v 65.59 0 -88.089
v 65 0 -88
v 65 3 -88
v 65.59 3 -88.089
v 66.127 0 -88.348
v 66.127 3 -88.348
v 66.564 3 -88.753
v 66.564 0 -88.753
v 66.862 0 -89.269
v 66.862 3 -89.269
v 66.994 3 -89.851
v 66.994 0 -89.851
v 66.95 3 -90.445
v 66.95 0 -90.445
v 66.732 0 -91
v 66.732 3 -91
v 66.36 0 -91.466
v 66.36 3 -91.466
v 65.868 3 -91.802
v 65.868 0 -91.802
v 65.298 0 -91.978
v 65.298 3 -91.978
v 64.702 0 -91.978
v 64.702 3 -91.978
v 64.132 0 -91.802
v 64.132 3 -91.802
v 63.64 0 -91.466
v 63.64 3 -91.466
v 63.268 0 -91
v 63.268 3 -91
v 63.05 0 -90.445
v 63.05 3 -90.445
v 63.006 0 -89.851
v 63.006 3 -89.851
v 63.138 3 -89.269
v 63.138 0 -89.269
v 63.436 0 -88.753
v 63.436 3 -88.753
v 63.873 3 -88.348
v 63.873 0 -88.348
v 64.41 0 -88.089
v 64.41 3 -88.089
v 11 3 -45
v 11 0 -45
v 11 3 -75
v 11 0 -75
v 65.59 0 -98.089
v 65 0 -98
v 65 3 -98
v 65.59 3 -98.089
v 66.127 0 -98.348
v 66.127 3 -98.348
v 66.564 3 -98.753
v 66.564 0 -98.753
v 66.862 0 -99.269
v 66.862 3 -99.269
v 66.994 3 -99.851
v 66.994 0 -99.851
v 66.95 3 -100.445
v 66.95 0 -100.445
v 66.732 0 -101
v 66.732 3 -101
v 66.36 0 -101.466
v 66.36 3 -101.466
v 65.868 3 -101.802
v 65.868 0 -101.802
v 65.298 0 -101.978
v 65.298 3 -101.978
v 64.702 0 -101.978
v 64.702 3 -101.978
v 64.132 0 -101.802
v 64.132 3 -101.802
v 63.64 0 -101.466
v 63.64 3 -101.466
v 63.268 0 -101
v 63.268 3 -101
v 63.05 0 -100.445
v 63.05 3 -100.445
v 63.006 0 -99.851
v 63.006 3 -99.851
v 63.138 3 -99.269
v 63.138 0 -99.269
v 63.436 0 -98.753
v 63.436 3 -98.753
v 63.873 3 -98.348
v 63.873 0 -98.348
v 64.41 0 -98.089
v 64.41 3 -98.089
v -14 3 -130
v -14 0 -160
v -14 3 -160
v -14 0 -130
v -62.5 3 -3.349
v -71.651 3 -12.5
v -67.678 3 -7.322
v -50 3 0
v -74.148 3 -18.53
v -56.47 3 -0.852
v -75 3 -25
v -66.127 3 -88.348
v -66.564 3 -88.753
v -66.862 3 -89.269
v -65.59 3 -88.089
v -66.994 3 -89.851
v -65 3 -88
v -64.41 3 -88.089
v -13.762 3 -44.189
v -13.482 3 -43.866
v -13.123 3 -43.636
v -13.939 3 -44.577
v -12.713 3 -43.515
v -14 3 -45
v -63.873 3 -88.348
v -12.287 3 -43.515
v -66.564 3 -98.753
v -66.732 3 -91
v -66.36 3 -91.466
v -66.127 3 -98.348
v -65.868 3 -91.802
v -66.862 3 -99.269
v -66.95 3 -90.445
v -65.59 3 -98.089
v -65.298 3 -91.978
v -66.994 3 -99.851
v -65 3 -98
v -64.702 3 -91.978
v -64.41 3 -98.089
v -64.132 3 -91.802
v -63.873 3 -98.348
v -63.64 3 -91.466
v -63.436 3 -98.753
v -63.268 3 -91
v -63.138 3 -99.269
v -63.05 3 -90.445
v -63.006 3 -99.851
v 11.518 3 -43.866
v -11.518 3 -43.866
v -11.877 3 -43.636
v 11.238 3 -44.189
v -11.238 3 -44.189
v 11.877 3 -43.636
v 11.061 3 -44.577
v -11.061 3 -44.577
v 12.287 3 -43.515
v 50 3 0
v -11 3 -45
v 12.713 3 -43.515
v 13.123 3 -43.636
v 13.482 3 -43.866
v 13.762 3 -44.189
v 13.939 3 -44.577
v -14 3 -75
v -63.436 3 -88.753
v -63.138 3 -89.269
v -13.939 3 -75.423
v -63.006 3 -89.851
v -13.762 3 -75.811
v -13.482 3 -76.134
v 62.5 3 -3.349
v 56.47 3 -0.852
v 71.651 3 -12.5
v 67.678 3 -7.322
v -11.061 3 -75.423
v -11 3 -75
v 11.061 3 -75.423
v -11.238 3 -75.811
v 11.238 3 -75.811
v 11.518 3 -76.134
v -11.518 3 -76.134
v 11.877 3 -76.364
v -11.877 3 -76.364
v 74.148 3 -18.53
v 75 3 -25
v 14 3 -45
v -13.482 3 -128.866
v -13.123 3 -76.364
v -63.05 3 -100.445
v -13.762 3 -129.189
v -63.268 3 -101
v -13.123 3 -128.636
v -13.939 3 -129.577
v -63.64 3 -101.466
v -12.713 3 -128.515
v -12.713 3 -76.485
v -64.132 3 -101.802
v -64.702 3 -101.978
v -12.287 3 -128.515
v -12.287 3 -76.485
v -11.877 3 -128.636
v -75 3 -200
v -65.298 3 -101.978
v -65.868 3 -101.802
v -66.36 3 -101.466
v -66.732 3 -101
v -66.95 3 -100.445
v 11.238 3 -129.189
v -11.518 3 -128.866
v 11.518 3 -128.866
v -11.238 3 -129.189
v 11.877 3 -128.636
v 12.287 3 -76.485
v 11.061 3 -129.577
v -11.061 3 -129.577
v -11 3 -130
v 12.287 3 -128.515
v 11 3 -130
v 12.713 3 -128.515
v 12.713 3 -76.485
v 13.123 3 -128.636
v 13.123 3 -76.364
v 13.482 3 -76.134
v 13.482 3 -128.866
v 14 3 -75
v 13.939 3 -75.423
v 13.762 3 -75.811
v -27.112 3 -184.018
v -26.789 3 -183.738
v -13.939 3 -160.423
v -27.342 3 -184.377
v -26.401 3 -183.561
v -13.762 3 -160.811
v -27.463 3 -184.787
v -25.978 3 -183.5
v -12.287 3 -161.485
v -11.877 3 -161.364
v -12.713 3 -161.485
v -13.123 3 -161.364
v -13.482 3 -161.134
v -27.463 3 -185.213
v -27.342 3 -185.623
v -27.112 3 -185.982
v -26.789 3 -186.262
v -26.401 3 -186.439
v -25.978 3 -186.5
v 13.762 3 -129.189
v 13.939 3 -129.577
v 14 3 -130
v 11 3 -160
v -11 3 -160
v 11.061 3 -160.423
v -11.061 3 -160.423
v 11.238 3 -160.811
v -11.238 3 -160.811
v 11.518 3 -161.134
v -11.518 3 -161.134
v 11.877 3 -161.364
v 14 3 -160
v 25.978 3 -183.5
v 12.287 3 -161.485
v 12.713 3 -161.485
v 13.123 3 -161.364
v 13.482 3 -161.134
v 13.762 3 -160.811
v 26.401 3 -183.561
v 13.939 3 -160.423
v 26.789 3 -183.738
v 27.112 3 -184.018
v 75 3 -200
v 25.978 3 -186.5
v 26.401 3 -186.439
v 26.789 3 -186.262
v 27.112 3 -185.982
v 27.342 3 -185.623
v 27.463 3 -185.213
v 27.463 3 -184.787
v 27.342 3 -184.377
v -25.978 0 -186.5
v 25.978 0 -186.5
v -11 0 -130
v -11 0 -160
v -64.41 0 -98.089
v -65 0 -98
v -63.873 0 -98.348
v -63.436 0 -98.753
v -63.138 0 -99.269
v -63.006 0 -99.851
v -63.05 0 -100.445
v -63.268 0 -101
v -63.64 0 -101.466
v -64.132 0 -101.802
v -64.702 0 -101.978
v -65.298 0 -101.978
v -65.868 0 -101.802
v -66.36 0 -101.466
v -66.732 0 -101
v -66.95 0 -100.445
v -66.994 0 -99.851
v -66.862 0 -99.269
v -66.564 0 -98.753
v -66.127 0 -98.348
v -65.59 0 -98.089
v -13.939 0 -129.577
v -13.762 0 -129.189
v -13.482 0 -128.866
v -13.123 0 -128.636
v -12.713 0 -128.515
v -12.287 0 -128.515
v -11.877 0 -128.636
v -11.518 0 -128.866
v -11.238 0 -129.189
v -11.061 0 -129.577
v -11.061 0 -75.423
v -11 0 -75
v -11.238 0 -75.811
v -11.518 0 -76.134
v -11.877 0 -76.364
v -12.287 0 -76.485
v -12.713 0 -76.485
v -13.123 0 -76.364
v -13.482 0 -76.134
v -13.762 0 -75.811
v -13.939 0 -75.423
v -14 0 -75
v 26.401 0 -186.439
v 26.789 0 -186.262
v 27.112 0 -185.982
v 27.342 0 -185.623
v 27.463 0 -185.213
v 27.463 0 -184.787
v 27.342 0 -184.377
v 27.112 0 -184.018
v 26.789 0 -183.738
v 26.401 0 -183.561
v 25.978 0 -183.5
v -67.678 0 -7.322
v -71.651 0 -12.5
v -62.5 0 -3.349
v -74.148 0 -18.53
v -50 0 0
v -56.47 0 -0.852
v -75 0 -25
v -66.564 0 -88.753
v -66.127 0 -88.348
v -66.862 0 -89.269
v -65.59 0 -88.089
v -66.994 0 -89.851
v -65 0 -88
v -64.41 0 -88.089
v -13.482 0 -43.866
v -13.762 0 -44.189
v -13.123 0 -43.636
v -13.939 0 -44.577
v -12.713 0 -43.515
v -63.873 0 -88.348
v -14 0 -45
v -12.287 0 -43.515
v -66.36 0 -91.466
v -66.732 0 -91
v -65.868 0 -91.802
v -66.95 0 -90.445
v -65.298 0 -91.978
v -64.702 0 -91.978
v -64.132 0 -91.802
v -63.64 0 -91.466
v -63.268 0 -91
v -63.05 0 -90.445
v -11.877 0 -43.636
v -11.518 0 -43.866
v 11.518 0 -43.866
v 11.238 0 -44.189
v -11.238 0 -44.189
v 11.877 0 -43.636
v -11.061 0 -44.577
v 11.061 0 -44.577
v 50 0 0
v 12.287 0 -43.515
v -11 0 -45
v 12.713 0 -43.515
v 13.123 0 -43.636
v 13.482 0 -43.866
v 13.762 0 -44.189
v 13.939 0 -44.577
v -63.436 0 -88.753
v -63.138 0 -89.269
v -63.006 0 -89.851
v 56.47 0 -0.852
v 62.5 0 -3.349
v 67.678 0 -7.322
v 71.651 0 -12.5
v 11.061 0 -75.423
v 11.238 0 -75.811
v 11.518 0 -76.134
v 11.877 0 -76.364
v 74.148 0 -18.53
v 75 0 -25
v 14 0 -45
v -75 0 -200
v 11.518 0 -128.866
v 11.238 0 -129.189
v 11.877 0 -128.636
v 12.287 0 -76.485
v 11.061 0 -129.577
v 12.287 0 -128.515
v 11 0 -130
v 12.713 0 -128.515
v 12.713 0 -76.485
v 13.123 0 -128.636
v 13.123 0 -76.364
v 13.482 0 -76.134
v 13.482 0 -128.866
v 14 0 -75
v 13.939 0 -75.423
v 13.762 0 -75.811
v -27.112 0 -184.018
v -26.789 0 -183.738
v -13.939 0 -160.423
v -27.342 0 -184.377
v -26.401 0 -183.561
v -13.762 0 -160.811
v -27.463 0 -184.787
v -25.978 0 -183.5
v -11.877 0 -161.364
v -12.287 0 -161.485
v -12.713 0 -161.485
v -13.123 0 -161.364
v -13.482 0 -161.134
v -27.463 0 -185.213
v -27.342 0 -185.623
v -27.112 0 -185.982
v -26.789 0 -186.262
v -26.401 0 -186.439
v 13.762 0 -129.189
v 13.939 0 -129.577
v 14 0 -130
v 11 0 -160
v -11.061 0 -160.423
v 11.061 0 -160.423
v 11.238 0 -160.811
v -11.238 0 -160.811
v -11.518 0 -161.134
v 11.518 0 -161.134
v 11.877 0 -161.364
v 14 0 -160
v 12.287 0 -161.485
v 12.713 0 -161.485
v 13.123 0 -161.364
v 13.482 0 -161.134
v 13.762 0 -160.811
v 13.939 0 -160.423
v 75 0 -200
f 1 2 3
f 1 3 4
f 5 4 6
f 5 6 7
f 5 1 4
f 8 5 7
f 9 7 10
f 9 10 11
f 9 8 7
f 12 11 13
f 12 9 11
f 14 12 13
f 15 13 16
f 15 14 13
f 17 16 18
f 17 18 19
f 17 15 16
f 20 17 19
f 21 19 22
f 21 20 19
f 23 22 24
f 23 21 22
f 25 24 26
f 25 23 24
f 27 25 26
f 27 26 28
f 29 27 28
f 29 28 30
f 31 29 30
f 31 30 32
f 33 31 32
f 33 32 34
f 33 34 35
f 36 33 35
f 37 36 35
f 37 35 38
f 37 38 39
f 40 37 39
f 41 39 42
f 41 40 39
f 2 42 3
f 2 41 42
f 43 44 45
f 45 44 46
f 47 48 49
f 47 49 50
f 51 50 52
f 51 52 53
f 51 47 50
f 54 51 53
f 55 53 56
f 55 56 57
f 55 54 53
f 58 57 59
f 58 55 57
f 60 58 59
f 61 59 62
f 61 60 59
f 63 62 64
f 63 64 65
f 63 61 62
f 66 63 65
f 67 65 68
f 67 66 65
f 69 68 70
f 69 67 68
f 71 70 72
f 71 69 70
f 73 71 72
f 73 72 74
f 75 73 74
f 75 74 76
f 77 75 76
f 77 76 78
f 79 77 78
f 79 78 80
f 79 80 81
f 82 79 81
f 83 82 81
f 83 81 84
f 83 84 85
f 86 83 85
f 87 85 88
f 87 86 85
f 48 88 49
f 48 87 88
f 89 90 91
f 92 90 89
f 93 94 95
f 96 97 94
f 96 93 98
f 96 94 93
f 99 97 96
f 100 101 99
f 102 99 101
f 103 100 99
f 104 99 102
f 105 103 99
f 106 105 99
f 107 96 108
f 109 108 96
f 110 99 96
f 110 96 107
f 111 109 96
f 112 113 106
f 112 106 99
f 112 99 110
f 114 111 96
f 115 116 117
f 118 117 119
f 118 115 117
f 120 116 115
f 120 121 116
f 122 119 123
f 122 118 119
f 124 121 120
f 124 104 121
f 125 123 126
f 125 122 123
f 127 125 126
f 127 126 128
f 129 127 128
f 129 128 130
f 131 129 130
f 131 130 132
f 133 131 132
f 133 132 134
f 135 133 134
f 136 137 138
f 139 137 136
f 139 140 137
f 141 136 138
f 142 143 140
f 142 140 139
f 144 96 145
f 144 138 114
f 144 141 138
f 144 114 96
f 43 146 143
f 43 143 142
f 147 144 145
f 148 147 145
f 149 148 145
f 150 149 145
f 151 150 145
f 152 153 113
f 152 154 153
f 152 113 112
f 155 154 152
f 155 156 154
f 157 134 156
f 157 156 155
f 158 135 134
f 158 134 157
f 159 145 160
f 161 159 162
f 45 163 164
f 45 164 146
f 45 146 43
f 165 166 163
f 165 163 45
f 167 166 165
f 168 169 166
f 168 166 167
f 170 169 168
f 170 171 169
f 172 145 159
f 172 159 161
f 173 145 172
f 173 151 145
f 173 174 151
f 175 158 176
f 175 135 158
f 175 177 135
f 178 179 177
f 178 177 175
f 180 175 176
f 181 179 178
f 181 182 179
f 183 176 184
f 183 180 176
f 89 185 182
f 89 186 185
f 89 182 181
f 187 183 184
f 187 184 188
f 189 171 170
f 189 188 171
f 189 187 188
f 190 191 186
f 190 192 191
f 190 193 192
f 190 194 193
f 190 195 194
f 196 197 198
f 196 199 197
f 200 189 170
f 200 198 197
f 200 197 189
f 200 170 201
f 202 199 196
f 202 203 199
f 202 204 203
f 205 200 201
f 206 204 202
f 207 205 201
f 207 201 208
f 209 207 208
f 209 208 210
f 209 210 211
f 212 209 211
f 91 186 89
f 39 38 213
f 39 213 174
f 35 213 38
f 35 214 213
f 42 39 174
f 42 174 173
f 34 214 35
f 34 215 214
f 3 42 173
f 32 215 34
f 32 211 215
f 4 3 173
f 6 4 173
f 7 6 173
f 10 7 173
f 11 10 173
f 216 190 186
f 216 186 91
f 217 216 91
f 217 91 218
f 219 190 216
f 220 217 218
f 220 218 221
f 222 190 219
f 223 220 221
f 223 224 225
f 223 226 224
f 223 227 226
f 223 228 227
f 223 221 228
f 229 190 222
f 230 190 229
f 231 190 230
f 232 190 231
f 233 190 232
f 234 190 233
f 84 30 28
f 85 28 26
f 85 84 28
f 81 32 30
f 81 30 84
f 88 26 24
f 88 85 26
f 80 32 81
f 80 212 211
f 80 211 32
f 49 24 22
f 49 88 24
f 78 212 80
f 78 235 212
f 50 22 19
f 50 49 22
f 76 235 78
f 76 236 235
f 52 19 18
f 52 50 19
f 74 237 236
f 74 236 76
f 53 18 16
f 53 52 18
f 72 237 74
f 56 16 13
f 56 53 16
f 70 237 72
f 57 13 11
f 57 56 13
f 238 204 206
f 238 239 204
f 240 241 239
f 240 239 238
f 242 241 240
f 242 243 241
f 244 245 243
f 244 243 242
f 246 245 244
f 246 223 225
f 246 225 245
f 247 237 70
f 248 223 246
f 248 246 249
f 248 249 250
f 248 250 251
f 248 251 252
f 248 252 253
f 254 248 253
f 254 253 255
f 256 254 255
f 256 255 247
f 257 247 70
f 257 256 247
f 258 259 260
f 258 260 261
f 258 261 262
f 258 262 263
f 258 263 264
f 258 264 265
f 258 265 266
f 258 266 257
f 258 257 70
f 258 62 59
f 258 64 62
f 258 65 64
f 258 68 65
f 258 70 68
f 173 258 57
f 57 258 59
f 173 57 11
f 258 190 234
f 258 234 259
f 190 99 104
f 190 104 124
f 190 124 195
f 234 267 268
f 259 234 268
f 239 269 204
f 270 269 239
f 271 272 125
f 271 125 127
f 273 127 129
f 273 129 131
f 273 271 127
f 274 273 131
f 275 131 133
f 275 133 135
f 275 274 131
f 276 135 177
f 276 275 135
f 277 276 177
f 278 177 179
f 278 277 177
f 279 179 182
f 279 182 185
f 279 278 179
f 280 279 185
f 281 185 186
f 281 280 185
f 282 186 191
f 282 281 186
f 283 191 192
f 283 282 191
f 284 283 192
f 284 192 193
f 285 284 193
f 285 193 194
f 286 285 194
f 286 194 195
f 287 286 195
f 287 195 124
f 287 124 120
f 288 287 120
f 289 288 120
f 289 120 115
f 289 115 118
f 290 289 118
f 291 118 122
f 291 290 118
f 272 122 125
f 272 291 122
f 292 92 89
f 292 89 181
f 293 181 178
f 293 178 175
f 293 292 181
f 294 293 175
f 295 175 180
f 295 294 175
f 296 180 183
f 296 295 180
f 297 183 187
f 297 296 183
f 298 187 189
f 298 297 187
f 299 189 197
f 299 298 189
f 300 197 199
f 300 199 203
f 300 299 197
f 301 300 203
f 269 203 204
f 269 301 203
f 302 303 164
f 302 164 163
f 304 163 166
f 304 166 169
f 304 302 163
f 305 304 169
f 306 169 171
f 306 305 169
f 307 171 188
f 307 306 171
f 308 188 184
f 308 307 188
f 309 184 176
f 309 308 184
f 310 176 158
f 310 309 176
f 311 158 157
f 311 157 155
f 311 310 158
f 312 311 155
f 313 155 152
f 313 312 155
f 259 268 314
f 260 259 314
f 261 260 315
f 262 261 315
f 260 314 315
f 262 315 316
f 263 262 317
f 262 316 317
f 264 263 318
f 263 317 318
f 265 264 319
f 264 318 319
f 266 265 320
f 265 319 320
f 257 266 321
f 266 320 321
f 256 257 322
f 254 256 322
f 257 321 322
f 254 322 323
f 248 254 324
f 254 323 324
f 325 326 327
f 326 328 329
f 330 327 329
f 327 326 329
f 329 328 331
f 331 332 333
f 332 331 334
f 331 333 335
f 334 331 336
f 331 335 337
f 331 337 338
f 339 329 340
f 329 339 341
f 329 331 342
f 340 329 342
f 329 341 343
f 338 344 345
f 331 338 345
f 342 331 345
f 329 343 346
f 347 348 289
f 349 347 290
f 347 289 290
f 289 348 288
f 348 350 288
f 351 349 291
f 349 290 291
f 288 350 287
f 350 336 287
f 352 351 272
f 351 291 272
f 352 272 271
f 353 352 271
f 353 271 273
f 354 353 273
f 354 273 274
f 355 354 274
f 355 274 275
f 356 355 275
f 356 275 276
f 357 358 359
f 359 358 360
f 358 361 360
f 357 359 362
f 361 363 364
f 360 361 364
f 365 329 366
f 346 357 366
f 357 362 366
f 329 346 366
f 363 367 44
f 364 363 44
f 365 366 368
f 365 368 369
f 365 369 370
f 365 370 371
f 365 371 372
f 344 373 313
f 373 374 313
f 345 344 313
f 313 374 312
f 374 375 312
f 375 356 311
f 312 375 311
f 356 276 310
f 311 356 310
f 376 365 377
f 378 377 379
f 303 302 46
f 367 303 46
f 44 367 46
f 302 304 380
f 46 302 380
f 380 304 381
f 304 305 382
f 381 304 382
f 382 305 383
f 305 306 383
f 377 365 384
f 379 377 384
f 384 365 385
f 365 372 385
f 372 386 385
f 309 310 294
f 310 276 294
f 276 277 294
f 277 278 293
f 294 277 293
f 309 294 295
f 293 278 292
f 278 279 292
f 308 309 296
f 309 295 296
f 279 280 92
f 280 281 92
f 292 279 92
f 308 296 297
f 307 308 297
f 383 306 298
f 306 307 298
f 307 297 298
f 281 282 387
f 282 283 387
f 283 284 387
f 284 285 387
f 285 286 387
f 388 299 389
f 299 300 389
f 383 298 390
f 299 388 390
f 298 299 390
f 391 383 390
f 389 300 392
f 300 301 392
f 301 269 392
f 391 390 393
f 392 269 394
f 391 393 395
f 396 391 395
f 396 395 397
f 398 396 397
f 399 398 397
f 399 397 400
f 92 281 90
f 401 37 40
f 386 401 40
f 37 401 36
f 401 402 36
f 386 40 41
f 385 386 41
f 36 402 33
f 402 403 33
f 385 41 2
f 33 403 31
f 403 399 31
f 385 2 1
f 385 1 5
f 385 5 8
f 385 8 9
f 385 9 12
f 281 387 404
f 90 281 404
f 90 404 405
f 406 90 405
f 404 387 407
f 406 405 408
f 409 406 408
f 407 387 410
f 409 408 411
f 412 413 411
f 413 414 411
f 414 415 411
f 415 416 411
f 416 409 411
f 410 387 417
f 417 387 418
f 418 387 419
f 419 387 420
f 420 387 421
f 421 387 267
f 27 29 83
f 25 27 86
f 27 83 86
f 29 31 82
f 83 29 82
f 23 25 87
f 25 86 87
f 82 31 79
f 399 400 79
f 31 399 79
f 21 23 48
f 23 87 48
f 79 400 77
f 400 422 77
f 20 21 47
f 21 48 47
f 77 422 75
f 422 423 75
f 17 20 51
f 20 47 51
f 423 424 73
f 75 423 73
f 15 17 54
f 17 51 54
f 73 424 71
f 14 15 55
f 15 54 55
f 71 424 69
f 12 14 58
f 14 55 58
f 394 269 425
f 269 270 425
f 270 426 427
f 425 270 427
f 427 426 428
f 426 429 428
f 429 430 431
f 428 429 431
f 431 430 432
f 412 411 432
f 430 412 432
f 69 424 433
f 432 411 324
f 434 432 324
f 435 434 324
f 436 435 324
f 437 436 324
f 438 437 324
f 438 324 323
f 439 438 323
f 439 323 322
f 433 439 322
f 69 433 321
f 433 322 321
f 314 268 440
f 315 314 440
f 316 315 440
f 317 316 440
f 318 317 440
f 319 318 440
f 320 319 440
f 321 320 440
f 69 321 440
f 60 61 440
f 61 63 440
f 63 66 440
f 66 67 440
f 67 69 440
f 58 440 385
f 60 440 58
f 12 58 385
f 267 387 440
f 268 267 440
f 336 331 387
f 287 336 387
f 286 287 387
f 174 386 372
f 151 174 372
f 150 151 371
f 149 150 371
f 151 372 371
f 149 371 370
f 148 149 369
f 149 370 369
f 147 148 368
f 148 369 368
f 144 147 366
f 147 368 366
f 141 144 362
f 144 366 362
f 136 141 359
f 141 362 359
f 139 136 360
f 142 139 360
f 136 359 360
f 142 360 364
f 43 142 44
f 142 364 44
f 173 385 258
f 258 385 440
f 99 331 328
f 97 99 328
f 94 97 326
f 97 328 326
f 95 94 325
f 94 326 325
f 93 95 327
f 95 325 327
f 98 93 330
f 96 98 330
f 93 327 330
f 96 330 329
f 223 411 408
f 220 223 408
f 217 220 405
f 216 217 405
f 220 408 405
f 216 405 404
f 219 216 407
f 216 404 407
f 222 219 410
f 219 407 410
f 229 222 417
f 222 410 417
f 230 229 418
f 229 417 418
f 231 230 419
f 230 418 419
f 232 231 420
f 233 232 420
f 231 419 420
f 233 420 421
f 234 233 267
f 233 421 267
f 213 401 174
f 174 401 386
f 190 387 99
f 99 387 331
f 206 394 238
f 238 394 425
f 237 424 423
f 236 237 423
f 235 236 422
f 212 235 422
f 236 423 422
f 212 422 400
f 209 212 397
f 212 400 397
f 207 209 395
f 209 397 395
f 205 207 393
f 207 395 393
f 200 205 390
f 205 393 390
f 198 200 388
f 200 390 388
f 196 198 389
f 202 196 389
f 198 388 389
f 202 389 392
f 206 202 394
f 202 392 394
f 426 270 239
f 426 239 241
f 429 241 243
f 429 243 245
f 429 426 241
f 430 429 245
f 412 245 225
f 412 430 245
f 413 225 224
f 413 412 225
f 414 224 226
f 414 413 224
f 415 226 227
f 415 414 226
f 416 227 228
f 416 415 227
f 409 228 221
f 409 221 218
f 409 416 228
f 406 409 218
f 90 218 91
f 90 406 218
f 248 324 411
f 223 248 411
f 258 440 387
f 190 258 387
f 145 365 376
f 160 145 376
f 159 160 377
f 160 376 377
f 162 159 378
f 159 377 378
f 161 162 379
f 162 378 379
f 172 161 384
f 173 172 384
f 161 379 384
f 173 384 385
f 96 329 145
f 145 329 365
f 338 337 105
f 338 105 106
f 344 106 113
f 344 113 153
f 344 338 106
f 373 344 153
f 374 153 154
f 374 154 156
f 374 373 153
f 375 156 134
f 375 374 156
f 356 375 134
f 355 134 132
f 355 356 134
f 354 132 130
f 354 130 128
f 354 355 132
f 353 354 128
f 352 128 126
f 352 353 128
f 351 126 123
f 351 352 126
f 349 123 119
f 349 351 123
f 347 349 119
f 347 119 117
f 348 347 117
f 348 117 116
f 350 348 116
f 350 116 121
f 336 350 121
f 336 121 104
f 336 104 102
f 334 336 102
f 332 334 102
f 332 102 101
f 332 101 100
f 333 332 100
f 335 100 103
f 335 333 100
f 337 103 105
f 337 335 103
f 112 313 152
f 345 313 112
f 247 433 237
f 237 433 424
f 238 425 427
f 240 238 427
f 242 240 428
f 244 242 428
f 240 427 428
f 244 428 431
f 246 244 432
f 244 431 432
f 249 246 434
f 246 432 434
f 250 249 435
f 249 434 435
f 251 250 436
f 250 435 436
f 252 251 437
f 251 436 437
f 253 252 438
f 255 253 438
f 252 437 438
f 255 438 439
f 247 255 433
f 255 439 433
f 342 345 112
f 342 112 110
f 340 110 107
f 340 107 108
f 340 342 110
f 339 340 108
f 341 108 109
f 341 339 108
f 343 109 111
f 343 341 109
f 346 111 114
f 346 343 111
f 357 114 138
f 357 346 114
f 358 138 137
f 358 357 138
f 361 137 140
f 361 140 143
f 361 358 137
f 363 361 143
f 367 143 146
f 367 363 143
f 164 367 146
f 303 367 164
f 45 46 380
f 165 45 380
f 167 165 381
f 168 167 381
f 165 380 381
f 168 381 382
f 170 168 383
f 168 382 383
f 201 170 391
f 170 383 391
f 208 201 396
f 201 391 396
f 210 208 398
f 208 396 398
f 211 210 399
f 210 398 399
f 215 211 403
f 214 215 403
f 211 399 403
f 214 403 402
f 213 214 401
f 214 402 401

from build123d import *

# Parameters (mm, degrees)
SKETCH1_R           = 2
BOSS_EXTRUDE1_DEPTH = 3


with BuildPart() as part:
    # Sketch1 → Boss-Extrude1 (new body)
    with BuildSketch(Plane(origin=(0, 0, 0), x_dir=(1, 0, 0), z_dir=(0, 1, 0))):
        with BuildLine():
            Line((-50, 0), (50, 0))
            ThreePointArc((50, 0), (67.67766953, 7.32233047), (75, 25))
            Line((75, 25), (75, 200))
            Line((75, 200), (-75, 200))
            Line((-75, 200), (-75, 25))
            ThreePointArc((-75, 25), (-67.67766953, 7.32233047), (-50, 0))
        make_face()
        with Locations(Location((65, 100, 0), (0, 0, 270))):
            Circle(SKETCH1_R, mode=Mode.SUBTRACT)
        with Locations(Location((65, 90, 0), (0, 0, 270))):
            Circle(SKETCH1_R, mode=Mode.SUBTRACT)
        with Locations(Location((-65, 90, 0), (0, 0, 270))):
            Circle(SKETCH1_R, mode=Mode.SUBTRACT)
        with Locations(Location((-65, 100, 0), (0, 0, 270))):
            Circle(SKETCH1_R, mode=Mode.SUBTRACT)
        with BuildLine():
            Line((-25.977942191, 186.5), (25.977942191, 186.5))
            ThreePointArc((25.977942191, 186.5), (27.477942191, 185), (25.977942191, 183.5))
            Line((25.977942191, 183.5), (-25.977942191, 183.5))
            ThreePointArc((-25.977942191, 183.5), (-27.477942191, 185), (-25.977942191, 186.5))
        make_face(mode=Mode.SUBTRACT)
        with BuildLine():
            Line((14, 160), (14, 130))
            ThreePointArc((14, 130), (12.5, 128.5), (11, 130))
            Line((11, 130), (11, 160))
            ThreePointArc((11, 160), (12.5, 161.5), (14, 160))
        make_face(mode=Mode.SUBTRACT)
        with BuildLine():
            Line((14, 75), (14, 45))
            ThreePointArc((14, 45), (12.5, 43.5), (11, 45))
            Line((11, 45), (11, 75))
            ThreePointArc((11, 75), (12.5, 76.5), (14, 75))
        make_face(mode=Mode.SUBTRACT)
        with BuildLine():
            Line((-14, 75), (-14, 45))
            ThreePointArc((-14, 45), (-12.5, 43.5), (-11, 45))
            Line((-11, 45), (-11, 75))
            ThreePointArc((-11, 75), (-12.5, 76.5), (-14, 75))
        make_face(mode=Mode.SUBTRACT)
        with BuildLine():
            Line((-14, 160), (-14, 130))
            ThreePointArc((-14, 130), (-12.5, 128.5), (-11, 130))
            Line((-11, 130), (-11, 160))
            ThreePointArc((-11, 160), (-12.5, 161.5), (-14, 160))
        make_face(mode=Mode.SUBTRACT)
    extrude(amount=BOSS_EXTRUDE1_DEPTH)


solid = part.part
